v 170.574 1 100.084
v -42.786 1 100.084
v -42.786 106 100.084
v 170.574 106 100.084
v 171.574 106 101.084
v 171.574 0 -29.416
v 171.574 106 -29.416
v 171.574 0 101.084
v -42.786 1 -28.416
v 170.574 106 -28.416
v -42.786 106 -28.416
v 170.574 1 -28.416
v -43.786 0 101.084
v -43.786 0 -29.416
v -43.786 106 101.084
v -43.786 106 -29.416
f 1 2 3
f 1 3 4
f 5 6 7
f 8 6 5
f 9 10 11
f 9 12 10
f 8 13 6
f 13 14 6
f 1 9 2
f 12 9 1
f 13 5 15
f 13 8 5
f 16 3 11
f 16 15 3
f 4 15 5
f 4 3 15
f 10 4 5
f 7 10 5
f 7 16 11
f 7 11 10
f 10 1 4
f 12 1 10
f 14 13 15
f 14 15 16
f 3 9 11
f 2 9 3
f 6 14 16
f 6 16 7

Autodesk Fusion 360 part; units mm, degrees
sketch "shape" plane through (0, 0, 0) normal (0, 1, 0) x (1, 0, 0)
  line L0 (170.5738, 28.4165) -> (-42.7862, 28.4165)
  line L1 (-42.7862, 28.4165) -> (-42.7862, -100.0835)
  line L2 (170.5738, -100.0835) -> (170.5738, 28.4165)
  line L3 (-42.7862, -100.0835) -> (170.5738, -100.0835)
  line L4 (-42.7862, 28.4165) -> (-42.7862, 29.4165)
  line L5 (-42.7862, 28.4165) -> (-43.7862, 28.4165)
  line L6 (-42.7862, 28.4165) -> (-43.7862, 28.4165)
  line L7 (-43.7862, 28.4165) -> (-43.7862, 29.4165)
  line L8 (-43.7862, 29.4165) -> (-42.7862, 29.4165)
  line L9 (-42.7862, 29.4165) -> (-42.7862, 28.4165)
  line L10 (-43.7862, 29.4165) -> (171.5738, 29.4165)
  line L11 (171.5738, 29.4165) -> (171.5738, -101.0835)
  line L12 (171.5738, -101.0835) -> (-43.7862, -101.0835)
  line L13 (-43.7862, -101.0835) -> (-43.7862, 29.4165)
  dimension "d1" = 213.36
  dimension "d2" = 128.5
  dimension "d3" = 1
  dimension "d4" = 1
  dimension "d5" = 130.5
extrude "Extrude1" add sketch "shape" along normal blind 1 contours L0 L1 L2 L3
extrude "Extrude2" add sketch "shape" along normal blind 106
